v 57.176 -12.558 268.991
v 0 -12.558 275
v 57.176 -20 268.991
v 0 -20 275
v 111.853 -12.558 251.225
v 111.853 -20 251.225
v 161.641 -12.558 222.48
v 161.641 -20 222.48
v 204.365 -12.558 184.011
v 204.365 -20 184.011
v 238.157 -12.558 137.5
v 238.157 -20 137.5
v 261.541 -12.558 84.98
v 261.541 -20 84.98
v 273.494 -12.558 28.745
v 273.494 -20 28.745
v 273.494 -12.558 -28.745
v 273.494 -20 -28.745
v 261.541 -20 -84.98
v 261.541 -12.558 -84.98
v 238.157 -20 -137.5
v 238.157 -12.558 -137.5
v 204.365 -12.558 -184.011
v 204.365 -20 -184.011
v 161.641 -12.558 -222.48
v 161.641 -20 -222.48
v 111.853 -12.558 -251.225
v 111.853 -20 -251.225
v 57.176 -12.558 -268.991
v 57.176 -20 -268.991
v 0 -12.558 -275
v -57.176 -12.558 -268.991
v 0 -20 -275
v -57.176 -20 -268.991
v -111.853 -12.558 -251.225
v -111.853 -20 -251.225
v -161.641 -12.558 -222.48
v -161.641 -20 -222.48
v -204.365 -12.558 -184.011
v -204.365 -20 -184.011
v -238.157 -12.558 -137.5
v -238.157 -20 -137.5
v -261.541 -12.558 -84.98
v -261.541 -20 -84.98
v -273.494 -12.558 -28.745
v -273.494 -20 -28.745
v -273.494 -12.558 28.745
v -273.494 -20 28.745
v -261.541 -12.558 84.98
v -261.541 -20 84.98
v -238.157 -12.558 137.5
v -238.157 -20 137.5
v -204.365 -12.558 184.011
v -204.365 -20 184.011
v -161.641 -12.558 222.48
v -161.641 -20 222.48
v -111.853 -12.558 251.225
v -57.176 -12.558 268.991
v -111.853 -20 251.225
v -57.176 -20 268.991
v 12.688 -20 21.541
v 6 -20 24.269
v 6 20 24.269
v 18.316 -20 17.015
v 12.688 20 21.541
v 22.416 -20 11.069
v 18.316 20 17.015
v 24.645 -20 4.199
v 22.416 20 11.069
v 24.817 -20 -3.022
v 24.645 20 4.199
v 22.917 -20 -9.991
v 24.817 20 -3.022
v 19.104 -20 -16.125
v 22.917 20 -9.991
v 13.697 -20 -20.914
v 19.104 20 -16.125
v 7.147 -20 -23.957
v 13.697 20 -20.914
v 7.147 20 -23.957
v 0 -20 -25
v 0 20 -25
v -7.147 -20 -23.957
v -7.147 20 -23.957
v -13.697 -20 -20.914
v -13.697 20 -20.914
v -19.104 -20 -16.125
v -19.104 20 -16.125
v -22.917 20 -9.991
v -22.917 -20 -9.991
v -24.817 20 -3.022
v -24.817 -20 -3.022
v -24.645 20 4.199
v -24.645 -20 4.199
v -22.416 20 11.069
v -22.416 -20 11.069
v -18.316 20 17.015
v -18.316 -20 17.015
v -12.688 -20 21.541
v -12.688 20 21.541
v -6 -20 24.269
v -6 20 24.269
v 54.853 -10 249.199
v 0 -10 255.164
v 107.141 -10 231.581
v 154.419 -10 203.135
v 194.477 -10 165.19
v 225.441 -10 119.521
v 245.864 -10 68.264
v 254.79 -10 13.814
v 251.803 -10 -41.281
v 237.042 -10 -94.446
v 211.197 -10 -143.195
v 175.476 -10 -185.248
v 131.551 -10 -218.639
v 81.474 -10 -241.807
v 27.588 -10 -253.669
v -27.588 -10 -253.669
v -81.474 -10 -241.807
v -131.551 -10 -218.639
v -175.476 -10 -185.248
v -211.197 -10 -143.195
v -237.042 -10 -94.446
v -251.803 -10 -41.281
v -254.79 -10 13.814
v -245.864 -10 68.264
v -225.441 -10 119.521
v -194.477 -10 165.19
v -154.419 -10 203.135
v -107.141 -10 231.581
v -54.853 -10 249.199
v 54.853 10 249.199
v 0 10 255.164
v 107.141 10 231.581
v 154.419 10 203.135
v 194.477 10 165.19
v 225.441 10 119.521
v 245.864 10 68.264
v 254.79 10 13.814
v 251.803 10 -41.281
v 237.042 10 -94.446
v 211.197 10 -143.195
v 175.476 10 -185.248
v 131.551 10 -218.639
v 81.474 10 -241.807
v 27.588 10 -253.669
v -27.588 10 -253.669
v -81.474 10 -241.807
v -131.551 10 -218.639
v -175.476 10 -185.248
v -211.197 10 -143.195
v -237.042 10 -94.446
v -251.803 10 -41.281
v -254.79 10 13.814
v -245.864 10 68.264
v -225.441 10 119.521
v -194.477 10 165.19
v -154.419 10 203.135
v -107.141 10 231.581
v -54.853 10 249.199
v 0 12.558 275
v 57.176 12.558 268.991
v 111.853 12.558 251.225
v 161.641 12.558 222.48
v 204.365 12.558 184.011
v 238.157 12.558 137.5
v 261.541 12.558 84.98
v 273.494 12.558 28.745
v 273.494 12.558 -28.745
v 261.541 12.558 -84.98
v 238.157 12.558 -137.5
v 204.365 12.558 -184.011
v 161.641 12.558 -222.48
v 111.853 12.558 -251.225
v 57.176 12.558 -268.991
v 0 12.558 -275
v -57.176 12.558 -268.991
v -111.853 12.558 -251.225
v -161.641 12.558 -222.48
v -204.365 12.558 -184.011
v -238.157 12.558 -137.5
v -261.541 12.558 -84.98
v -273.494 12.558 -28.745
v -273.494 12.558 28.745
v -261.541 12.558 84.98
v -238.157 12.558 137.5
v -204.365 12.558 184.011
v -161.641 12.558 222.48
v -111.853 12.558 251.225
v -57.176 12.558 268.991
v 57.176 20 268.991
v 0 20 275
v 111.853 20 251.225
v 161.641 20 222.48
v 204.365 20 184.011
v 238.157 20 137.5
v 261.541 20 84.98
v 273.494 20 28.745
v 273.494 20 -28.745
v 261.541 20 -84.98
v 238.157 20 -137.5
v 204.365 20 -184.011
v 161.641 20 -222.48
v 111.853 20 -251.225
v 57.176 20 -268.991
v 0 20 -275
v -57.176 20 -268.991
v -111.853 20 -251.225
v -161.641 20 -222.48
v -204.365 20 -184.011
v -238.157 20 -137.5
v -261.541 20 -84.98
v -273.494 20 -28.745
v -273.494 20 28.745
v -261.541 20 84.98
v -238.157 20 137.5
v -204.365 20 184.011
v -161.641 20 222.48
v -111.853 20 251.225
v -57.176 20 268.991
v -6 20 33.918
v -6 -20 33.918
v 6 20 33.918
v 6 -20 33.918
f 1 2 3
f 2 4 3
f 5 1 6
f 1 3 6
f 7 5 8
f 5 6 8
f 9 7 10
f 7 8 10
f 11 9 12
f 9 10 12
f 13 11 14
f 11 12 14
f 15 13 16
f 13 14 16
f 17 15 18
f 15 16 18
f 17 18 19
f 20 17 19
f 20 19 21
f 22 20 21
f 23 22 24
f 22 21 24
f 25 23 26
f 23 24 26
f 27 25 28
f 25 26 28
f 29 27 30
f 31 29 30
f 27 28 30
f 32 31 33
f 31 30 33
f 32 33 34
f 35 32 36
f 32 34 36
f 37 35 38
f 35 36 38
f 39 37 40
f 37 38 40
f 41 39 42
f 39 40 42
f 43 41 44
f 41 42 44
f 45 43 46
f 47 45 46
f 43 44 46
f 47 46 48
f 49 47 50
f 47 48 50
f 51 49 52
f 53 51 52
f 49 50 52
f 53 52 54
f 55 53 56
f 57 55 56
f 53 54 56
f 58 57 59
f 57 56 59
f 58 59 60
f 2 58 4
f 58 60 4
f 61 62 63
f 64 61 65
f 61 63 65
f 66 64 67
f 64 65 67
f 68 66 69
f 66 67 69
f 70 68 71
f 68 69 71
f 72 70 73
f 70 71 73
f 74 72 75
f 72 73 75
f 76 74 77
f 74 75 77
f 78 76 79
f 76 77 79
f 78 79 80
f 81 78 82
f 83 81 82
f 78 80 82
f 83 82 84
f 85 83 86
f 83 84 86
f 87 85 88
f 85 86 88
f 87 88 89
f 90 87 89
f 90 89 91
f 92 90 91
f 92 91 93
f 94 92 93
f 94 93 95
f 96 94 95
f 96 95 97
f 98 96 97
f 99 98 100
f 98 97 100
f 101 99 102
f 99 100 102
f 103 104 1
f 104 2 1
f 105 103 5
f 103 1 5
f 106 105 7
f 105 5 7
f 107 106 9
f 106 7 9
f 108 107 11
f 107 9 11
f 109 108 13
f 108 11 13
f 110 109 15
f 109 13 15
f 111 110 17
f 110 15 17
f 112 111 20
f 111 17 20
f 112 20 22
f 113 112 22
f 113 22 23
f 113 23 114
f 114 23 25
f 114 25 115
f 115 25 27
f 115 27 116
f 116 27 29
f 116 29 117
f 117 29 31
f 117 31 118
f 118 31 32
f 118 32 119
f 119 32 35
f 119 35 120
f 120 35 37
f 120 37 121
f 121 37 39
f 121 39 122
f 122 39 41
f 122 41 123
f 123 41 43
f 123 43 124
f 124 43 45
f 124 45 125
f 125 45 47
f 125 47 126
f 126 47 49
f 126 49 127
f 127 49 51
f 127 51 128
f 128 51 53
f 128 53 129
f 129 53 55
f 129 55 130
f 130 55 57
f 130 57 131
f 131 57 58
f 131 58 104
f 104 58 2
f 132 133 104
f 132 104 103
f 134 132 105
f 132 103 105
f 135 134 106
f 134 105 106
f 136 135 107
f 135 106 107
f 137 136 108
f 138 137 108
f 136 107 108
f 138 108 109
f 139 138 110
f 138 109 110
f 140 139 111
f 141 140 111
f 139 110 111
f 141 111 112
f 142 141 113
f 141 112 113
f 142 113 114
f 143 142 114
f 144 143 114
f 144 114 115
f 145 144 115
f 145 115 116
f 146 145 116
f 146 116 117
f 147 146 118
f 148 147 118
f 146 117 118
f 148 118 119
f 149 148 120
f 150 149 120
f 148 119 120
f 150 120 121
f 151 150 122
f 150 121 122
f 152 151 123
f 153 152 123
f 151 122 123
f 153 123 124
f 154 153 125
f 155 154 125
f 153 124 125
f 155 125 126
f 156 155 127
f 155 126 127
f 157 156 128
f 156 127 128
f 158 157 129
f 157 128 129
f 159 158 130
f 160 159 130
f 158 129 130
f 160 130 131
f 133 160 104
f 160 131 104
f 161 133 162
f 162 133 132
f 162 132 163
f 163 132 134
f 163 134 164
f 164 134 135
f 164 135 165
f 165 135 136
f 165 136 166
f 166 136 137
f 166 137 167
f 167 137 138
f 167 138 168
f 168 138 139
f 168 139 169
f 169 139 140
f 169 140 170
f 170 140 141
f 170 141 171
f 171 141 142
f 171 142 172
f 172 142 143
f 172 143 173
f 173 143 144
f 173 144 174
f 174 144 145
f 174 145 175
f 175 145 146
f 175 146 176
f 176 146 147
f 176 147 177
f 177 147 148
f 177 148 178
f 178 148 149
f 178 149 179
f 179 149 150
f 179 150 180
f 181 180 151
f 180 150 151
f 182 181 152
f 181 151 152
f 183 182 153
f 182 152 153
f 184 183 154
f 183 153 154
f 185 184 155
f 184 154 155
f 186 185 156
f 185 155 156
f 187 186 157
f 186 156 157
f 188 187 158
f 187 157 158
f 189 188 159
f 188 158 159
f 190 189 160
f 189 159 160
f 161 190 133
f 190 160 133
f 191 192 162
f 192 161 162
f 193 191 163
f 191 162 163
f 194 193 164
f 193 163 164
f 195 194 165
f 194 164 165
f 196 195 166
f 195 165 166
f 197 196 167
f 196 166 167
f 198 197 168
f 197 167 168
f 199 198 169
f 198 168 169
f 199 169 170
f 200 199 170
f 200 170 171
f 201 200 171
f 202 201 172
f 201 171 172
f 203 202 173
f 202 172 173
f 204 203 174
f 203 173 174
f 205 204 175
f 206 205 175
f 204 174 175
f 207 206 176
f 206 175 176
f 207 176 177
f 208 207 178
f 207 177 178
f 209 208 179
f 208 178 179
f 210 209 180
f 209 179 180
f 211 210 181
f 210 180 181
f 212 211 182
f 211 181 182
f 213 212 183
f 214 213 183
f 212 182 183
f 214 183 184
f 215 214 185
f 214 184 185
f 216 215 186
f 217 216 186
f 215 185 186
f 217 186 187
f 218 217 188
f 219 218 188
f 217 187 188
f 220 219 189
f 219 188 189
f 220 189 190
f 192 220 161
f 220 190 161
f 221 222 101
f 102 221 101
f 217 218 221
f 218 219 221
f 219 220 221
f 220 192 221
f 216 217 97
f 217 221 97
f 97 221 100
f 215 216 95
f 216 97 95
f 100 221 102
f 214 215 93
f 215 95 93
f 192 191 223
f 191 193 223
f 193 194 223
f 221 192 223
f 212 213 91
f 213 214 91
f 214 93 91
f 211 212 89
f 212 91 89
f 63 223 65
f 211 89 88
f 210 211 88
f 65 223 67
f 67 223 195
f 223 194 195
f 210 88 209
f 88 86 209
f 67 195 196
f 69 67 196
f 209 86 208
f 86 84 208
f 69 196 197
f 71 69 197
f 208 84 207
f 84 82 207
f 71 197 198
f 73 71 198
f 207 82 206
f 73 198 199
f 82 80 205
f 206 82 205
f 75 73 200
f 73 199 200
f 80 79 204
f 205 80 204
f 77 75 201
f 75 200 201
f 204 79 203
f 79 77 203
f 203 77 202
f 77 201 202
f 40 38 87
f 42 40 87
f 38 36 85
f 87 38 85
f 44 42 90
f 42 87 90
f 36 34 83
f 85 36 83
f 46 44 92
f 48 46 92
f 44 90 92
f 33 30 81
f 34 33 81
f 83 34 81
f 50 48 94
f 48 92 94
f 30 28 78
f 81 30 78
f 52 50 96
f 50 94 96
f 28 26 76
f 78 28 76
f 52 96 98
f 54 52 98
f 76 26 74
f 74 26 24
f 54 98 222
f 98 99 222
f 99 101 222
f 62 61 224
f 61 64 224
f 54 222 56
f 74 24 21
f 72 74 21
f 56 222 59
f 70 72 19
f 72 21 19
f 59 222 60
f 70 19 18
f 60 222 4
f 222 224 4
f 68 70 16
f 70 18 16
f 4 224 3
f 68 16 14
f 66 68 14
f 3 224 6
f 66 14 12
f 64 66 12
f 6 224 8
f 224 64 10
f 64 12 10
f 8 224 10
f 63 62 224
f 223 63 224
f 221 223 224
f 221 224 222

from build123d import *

# Parameters (mm, degrees)
F3_DEPTH = 40.001


with BuildPart() as f1:
    # F0 (on Right) → F1 (revolve)
    with BuildSketch(Plane.YZ):
        Polygon((-20, 25), (0, 25), (20, 25), (20, 275), (12.558388, 275), (10, 255.164309), (0, 255.164309), (-10, 255.164309), (-12.558388, 275), (-20, 275), align=None)
    revolve(axis=Axis((0, 0.25152, 0), (0, 1, 0)))

    # F2 (on face) → F3 (cut, through all)
    with BuildSketch(Plane.XZ.offset(20)):
        Polygon((0, 33.918292), (-6, 33.918292), (-6, 23.918292), (0, 23.918292), (6, 23.918292), (6, 33.918292), align=None)
    extrude(amount=-F3_DEPTH, mode=Mode.SUBTRACT)


solid = f1.part
